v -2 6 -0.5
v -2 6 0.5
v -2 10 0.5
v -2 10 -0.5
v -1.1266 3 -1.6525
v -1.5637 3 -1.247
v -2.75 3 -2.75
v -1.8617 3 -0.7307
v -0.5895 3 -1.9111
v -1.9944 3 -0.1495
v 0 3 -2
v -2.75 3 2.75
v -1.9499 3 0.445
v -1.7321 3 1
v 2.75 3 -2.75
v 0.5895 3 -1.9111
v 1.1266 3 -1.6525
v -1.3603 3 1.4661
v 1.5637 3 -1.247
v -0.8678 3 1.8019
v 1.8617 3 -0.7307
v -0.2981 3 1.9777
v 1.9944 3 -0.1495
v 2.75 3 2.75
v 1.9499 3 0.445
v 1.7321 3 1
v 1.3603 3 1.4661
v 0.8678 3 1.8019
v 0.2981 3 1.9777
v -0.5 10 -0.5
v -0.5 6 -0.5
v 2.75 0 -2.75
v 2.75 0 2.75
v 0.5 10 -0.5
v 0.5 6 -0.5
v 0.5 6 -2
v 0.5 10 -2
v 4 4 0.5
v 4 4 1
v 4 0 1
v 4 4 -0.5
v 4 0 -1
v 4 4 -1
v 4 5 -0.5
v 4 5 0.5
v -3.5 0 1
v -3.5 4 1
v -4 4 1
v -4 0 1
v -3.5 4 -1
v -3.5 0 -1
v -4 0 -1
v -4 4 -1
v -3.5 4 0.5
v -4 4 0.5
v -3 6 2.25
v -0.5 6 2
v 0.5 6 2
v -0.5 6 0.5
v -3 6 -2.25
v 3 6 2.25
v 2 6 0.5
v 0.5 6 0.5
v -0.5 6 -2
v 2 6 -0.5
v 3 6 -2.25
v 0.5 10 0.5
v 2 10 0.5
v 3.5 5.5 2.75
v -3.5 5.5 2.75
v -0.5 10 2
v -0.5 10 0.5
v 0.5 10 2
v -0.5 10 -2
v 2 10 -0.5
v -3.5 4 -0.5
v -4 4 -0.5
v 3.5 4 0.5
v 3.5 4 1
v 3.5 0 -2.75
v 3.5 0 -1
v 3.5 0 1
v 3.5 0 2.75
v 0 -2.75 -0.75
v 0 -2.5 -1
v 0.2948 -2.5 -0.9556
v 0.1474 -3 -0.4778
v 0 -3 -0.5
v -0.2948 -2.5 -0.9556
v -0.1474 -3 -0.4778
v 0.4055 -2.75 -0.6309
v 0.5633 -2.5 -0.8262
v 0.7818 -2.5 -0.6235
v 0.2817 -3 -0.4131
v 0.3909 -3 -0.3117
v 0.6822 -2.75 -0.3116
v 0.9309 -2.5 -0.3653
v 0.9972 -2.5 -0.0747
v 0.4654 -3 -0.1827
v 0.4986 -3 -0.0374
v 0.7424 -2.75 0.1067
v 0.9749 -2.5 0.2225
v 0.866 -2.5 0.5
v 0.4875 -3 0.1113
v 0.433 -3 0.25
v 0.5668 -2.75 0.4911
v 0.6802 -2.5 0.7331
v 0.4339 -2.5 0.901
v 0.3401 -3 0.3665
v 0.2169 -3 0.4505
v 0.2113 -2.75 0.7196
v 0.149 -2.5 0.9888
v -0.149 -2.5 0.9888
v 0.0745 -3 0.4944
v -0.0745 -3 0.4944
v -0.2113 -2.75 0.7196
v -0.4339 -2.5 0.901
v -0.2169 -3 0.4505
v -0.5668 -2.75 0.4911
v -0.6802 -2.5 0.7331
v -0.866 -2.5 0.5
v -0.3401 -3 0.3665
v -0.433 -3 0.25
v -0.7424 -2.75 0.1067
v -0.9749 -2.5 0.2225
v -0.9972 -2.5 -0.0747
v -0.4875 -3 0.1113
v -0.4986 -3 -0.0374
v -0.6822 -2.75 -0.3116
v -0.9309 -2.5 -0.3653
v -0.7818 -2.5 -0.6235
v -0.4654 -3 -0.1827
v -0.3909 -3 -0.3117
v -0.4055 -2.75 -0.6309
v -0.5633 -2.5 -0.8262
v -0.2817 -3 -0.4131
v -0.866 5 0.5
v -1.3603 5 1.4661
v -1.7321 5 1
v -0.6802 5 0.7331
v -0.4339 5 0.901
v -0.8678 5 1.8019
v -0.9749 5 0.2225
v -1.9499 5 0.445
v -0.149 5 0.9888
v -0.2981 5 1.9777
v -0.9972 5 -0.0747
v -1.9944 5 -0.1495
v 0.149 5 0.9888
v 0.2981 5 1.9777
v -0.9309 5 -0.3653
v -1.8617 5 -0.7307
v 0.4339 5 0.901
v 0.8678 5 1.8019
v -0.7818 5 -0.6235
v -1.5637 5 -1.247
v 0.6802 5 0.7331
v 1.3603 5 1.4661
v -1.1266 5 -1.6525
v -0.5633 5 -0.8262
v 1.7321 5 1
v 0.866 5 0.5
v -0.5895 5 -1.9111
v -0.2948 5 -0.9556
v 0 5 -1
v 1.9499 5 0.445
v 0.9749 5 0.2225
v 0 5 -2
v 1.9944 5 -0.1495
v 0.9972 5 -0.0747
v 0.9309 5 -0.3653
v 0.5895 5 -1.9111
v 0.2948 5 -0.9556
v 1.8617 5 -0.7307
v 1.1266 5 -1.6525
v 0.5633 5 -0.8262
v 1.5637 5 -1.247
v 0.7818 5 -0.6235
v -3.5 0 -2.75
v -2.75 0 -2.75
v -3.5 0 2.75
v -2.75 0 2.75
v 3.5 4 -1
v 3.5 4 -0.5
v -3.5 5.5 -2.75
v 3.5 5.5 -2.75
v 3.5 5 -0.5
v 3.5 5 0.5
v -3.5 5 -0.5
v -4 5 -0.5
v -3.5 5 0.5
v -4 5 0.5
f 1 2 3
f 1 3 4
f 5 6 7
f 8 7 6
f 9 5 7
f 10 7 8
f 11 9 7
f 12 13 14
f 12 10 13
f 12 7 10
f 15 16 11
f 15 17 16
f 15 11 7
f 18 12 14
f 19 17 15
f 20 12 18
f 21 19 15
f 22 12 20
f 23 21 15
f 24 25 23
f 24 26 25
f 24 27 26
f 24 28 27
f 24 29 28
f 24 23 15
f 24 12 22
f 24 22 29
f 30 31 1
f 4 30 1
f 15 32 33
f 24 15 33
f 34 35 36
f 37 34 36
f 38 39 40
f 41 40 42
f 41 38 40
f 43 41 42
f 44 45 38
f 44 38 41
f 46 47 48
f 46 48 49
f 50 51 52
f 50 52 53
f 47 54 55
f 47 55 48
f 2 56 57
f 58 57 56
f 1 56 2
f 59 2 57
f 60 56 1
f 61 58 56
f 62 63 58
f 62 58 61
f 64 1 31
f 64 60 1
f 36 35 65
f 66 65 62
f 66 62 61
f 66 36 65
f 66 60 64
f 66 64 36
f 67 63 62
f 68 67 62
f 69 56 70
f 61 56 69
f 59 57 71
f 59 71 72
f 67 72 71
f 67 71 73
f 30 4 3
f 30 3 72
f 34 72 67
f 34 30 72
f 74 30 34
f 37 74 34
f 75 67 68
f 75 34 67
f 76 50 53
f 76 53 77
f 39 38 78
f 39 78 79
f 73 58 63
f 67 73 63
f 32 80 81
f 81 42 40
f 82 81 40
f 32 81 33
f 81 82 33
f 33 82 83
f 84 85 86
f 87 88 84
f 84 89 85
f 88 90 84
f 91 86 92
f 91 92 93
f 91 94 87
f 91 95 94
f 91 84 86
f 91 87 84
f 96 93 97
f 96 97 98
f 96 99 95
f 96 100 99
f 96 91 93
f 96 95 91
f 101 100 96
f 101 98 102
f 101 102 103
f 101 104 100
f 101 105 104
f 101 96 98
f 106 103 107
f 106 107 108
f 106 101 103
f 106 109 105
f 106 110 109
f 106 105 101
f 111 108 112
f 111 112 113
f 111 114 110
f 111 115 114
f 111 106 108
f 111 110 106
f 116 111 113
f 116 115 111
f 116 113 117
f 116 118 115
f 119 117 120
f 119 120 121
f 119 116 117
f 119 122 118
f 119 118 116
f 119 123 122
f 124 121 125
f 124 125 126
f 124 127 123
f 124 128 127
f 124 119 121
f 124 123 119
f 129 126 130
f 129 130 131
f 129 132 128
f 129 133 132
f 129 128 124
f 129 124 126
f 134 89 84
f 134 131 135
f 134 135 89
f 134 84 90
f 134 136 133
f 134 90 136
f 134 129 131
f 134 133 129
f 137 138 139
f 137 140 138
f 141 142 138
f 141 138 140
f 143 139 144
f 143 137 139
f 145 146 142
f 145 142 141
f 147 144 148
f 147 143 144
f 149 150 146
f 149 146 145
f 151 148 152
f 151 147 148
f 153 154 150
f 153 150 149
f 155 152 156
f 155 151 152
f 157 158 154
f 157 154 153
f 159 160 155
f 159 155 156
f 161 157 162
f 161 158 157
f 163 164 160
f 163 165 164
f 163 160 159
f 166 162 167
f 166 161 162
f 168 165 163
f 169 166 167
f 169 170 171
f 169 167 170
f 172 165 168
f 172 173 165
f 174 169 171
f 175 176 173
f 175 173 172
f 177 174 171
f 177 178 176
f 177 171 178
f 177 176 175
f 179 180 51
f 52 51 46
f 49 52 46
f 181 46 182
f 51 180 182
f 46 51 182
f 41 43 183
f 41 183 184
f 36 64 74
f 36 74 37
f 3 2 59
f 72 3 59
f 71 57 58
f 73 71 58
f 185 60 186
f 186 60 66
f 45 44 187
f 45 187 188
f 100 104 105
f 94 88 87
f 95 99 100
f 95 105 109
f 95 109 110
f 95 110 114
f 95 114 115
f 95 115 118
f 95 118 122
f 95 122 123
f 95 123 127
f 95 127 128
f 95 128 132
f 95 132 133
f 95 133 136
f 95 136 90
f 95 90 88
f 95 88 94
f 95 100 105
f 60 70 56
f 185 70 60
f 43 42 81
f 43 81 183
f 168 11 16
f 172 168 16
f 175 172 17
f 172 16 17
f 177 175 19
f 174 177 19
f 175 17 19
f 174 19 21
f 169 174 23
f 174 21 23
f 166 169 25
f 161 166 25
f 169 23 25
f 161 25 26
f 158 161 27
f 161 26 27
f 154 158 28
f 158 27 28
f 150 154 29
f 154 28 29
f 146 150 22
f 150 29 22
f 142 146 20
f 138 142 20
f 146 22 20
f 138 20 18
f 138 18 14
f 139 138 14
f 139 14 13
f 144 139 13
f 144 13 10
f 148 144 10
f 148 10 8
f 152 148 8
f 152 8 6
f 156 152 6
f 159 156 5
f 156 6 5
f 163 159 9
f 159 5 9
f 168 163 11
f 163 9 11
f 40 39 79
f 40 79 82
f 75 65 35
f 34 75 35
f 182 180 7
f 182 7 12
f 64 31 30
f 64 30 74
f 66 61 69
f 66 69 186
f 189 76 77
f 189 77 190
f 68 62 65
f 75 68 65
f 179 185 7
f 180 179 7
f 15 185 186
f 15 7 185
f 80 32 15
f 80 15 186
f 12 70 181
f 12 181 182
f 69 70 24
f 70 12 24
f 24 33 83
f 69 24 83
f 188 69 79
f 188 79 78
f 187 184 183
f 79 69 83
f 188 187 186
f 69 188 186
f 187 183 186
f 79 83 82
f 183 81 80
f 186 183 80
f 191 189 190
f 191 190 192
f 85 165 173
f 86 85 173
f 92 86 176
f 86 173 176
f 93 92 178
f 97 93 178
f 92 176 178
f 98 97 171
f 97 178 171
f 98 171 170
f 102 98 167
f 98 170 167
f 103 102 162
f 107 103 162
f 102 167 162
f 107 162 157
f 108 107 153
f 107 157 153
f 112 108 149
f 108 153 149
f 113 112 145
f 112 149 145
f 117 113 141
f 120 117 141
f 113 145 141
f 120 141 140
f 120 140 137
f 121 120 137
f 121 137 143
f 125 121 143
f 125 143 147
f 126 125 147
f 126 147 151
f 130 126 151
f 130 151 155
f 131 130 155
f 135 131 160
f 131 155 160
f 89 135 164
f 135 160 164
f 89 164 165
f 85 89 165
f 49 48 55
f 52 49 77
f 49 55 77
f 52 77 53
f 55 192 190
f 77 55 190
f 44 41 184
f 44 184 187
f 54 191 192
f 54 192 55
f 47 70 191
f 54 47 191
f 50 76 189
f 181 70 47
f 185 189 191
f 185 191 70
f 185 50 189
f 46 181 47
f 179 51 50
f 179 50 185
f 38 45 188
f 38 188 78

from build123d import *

# Parameters (mm, degrees)
ESQUISSE1_W             = 7
ESQUISSE1_H             = 5.5
BOSS_EXTRU_1_DEPTH      = 6
BOSS_EXTRU_2_DEPTH      = 0.5
BOSS_EXTRU_2_DEPTH_BACK = 7.5
ESQUISSE2_W             = 5.5
ESQUISSE2_H             = 5.5
ENL_V_MAT_EXTRU_2_DEPTH = 3
ESQUISSE4_W             = 1.5
ESQUISSE4_H             = 1
ESQUISSE4_W_2           = 1
ESQUISSE4_H_2           = 1.5
BOSS_EXTRU_3_DEPTH      = 4
ESQUISSE5_R             = 2
ENL_V_MAT_EXTRU_3_DEPTH = 2
ESQUISSE6_R             = 1
BOSS_EXTRU_4_DEPTH      = 8
CHANFREIN1_SIZE         = 0.5


with BuildPart() as part:
    # Esquisse1 → Boss.-Extru.1 (new body)
    with BuildSketch(Plane(origin=(0, 0, 0), x_dir=(1, 0, 0), z_dir=(0, 1, 0))):
        Rectangle(ESQUISSE1_W, ESQUISSE1_H)
    extrude(amount=BOSS_EXTRU_1_DEPTH)

    # Esquisse3 → Boss.-Extru.2 (add, two sides: drawn at the far end of the back side and taken through both)
    with BuildSketch(Plane.ZY.offset(3.5).offset(-BOSS_EXTRU_2_DEPTH_BACK)):
        Polygon((0, 0), (-1, 0), (-1, 4), (-0.5, 4), (-0.5, 5), (0.5, 5), (0.5, 4), (1, 4), (1, 0), align=None)
    extrude(amount=BOSS_EXTRU_2_DEPTH + BOSS_EXTRU_2_DEPTH_BACK)

    # Esquisse2 → Enlèv. mat.-Extru.2 (cut)
    with BuildSketch(Plane.XZ):
        Rectangle(ESQUISSE2_W, ESQUISSE2_H)
    extrude(amount=-ENL_V_MAT_EXTRU_2_DEPTH, mode=Mode.SUBTRACT)

    # Esquisse4 → Boss.-Extru.3 (add)
    with BuildSketch(Plane(origin=(0, 6, 0), x_dir=(1, 0, 0), z_dir=(0, 1, 0))):
        with Locations((1.25, 0)):
            Rectangle(ESQUISSE4_W, ESQUISSE4_H)
        with Locations((0, -1.25)):
            Rectangle(ESQUISSE4_W_2, ESQUISSE4_H_2)
        with Locations((-1.25, 0)):
            Rectangle(ESQUISSE4_W, ESQUISSE4_H)
        Rectangle(ESQUISSE4_W_2, ESQUISSE4_H)
        with Locations((0, 1.25)):
            Rectangle(ESQUISSE4_W_2, ESQUISSE4_H_2)
    extrude(amount=BOSS_EXTRU_3_DEPTH)

    # Esquisse5 → Enlèv. mat.-Extru.3 (cut)
    with BuildSketch(Plane.XZ.offset(-3)):
        with Locations(Location((0, 0, 0), (0, 0, 270))):
            Circle(ESQUISSE5_R)
    extrude(amount=-ENL_V_MAT_EXTRU_3_DEPTH, mode=Mode.SUBTRACT)

    # Esquisse6 → Boss.-Extru.4 (add)
    with BuildSketch(Plane.XZ.offset(-5)):
        with Locations(Location((0, 0, 0), (0, 0, 270))):
            Circle(ESQUISSE6_R)
    extrude(amount=BOSS_EXTRU_4_DEPTH)

    # Chanfrein1
    chanfrein1_edges = [part.edges().sort_by_distance(p)[0] for p in [
        (0, -3, 1),
        (-3.5, 6, 0),
        (0, 6, 2.75),
        (3.5, 6, 0),
        (0, 6, -2.75),
    ]]
    chamfer(chanfrein1_edges, length=CHANFREIN1_SIZE)


solid = part.part
